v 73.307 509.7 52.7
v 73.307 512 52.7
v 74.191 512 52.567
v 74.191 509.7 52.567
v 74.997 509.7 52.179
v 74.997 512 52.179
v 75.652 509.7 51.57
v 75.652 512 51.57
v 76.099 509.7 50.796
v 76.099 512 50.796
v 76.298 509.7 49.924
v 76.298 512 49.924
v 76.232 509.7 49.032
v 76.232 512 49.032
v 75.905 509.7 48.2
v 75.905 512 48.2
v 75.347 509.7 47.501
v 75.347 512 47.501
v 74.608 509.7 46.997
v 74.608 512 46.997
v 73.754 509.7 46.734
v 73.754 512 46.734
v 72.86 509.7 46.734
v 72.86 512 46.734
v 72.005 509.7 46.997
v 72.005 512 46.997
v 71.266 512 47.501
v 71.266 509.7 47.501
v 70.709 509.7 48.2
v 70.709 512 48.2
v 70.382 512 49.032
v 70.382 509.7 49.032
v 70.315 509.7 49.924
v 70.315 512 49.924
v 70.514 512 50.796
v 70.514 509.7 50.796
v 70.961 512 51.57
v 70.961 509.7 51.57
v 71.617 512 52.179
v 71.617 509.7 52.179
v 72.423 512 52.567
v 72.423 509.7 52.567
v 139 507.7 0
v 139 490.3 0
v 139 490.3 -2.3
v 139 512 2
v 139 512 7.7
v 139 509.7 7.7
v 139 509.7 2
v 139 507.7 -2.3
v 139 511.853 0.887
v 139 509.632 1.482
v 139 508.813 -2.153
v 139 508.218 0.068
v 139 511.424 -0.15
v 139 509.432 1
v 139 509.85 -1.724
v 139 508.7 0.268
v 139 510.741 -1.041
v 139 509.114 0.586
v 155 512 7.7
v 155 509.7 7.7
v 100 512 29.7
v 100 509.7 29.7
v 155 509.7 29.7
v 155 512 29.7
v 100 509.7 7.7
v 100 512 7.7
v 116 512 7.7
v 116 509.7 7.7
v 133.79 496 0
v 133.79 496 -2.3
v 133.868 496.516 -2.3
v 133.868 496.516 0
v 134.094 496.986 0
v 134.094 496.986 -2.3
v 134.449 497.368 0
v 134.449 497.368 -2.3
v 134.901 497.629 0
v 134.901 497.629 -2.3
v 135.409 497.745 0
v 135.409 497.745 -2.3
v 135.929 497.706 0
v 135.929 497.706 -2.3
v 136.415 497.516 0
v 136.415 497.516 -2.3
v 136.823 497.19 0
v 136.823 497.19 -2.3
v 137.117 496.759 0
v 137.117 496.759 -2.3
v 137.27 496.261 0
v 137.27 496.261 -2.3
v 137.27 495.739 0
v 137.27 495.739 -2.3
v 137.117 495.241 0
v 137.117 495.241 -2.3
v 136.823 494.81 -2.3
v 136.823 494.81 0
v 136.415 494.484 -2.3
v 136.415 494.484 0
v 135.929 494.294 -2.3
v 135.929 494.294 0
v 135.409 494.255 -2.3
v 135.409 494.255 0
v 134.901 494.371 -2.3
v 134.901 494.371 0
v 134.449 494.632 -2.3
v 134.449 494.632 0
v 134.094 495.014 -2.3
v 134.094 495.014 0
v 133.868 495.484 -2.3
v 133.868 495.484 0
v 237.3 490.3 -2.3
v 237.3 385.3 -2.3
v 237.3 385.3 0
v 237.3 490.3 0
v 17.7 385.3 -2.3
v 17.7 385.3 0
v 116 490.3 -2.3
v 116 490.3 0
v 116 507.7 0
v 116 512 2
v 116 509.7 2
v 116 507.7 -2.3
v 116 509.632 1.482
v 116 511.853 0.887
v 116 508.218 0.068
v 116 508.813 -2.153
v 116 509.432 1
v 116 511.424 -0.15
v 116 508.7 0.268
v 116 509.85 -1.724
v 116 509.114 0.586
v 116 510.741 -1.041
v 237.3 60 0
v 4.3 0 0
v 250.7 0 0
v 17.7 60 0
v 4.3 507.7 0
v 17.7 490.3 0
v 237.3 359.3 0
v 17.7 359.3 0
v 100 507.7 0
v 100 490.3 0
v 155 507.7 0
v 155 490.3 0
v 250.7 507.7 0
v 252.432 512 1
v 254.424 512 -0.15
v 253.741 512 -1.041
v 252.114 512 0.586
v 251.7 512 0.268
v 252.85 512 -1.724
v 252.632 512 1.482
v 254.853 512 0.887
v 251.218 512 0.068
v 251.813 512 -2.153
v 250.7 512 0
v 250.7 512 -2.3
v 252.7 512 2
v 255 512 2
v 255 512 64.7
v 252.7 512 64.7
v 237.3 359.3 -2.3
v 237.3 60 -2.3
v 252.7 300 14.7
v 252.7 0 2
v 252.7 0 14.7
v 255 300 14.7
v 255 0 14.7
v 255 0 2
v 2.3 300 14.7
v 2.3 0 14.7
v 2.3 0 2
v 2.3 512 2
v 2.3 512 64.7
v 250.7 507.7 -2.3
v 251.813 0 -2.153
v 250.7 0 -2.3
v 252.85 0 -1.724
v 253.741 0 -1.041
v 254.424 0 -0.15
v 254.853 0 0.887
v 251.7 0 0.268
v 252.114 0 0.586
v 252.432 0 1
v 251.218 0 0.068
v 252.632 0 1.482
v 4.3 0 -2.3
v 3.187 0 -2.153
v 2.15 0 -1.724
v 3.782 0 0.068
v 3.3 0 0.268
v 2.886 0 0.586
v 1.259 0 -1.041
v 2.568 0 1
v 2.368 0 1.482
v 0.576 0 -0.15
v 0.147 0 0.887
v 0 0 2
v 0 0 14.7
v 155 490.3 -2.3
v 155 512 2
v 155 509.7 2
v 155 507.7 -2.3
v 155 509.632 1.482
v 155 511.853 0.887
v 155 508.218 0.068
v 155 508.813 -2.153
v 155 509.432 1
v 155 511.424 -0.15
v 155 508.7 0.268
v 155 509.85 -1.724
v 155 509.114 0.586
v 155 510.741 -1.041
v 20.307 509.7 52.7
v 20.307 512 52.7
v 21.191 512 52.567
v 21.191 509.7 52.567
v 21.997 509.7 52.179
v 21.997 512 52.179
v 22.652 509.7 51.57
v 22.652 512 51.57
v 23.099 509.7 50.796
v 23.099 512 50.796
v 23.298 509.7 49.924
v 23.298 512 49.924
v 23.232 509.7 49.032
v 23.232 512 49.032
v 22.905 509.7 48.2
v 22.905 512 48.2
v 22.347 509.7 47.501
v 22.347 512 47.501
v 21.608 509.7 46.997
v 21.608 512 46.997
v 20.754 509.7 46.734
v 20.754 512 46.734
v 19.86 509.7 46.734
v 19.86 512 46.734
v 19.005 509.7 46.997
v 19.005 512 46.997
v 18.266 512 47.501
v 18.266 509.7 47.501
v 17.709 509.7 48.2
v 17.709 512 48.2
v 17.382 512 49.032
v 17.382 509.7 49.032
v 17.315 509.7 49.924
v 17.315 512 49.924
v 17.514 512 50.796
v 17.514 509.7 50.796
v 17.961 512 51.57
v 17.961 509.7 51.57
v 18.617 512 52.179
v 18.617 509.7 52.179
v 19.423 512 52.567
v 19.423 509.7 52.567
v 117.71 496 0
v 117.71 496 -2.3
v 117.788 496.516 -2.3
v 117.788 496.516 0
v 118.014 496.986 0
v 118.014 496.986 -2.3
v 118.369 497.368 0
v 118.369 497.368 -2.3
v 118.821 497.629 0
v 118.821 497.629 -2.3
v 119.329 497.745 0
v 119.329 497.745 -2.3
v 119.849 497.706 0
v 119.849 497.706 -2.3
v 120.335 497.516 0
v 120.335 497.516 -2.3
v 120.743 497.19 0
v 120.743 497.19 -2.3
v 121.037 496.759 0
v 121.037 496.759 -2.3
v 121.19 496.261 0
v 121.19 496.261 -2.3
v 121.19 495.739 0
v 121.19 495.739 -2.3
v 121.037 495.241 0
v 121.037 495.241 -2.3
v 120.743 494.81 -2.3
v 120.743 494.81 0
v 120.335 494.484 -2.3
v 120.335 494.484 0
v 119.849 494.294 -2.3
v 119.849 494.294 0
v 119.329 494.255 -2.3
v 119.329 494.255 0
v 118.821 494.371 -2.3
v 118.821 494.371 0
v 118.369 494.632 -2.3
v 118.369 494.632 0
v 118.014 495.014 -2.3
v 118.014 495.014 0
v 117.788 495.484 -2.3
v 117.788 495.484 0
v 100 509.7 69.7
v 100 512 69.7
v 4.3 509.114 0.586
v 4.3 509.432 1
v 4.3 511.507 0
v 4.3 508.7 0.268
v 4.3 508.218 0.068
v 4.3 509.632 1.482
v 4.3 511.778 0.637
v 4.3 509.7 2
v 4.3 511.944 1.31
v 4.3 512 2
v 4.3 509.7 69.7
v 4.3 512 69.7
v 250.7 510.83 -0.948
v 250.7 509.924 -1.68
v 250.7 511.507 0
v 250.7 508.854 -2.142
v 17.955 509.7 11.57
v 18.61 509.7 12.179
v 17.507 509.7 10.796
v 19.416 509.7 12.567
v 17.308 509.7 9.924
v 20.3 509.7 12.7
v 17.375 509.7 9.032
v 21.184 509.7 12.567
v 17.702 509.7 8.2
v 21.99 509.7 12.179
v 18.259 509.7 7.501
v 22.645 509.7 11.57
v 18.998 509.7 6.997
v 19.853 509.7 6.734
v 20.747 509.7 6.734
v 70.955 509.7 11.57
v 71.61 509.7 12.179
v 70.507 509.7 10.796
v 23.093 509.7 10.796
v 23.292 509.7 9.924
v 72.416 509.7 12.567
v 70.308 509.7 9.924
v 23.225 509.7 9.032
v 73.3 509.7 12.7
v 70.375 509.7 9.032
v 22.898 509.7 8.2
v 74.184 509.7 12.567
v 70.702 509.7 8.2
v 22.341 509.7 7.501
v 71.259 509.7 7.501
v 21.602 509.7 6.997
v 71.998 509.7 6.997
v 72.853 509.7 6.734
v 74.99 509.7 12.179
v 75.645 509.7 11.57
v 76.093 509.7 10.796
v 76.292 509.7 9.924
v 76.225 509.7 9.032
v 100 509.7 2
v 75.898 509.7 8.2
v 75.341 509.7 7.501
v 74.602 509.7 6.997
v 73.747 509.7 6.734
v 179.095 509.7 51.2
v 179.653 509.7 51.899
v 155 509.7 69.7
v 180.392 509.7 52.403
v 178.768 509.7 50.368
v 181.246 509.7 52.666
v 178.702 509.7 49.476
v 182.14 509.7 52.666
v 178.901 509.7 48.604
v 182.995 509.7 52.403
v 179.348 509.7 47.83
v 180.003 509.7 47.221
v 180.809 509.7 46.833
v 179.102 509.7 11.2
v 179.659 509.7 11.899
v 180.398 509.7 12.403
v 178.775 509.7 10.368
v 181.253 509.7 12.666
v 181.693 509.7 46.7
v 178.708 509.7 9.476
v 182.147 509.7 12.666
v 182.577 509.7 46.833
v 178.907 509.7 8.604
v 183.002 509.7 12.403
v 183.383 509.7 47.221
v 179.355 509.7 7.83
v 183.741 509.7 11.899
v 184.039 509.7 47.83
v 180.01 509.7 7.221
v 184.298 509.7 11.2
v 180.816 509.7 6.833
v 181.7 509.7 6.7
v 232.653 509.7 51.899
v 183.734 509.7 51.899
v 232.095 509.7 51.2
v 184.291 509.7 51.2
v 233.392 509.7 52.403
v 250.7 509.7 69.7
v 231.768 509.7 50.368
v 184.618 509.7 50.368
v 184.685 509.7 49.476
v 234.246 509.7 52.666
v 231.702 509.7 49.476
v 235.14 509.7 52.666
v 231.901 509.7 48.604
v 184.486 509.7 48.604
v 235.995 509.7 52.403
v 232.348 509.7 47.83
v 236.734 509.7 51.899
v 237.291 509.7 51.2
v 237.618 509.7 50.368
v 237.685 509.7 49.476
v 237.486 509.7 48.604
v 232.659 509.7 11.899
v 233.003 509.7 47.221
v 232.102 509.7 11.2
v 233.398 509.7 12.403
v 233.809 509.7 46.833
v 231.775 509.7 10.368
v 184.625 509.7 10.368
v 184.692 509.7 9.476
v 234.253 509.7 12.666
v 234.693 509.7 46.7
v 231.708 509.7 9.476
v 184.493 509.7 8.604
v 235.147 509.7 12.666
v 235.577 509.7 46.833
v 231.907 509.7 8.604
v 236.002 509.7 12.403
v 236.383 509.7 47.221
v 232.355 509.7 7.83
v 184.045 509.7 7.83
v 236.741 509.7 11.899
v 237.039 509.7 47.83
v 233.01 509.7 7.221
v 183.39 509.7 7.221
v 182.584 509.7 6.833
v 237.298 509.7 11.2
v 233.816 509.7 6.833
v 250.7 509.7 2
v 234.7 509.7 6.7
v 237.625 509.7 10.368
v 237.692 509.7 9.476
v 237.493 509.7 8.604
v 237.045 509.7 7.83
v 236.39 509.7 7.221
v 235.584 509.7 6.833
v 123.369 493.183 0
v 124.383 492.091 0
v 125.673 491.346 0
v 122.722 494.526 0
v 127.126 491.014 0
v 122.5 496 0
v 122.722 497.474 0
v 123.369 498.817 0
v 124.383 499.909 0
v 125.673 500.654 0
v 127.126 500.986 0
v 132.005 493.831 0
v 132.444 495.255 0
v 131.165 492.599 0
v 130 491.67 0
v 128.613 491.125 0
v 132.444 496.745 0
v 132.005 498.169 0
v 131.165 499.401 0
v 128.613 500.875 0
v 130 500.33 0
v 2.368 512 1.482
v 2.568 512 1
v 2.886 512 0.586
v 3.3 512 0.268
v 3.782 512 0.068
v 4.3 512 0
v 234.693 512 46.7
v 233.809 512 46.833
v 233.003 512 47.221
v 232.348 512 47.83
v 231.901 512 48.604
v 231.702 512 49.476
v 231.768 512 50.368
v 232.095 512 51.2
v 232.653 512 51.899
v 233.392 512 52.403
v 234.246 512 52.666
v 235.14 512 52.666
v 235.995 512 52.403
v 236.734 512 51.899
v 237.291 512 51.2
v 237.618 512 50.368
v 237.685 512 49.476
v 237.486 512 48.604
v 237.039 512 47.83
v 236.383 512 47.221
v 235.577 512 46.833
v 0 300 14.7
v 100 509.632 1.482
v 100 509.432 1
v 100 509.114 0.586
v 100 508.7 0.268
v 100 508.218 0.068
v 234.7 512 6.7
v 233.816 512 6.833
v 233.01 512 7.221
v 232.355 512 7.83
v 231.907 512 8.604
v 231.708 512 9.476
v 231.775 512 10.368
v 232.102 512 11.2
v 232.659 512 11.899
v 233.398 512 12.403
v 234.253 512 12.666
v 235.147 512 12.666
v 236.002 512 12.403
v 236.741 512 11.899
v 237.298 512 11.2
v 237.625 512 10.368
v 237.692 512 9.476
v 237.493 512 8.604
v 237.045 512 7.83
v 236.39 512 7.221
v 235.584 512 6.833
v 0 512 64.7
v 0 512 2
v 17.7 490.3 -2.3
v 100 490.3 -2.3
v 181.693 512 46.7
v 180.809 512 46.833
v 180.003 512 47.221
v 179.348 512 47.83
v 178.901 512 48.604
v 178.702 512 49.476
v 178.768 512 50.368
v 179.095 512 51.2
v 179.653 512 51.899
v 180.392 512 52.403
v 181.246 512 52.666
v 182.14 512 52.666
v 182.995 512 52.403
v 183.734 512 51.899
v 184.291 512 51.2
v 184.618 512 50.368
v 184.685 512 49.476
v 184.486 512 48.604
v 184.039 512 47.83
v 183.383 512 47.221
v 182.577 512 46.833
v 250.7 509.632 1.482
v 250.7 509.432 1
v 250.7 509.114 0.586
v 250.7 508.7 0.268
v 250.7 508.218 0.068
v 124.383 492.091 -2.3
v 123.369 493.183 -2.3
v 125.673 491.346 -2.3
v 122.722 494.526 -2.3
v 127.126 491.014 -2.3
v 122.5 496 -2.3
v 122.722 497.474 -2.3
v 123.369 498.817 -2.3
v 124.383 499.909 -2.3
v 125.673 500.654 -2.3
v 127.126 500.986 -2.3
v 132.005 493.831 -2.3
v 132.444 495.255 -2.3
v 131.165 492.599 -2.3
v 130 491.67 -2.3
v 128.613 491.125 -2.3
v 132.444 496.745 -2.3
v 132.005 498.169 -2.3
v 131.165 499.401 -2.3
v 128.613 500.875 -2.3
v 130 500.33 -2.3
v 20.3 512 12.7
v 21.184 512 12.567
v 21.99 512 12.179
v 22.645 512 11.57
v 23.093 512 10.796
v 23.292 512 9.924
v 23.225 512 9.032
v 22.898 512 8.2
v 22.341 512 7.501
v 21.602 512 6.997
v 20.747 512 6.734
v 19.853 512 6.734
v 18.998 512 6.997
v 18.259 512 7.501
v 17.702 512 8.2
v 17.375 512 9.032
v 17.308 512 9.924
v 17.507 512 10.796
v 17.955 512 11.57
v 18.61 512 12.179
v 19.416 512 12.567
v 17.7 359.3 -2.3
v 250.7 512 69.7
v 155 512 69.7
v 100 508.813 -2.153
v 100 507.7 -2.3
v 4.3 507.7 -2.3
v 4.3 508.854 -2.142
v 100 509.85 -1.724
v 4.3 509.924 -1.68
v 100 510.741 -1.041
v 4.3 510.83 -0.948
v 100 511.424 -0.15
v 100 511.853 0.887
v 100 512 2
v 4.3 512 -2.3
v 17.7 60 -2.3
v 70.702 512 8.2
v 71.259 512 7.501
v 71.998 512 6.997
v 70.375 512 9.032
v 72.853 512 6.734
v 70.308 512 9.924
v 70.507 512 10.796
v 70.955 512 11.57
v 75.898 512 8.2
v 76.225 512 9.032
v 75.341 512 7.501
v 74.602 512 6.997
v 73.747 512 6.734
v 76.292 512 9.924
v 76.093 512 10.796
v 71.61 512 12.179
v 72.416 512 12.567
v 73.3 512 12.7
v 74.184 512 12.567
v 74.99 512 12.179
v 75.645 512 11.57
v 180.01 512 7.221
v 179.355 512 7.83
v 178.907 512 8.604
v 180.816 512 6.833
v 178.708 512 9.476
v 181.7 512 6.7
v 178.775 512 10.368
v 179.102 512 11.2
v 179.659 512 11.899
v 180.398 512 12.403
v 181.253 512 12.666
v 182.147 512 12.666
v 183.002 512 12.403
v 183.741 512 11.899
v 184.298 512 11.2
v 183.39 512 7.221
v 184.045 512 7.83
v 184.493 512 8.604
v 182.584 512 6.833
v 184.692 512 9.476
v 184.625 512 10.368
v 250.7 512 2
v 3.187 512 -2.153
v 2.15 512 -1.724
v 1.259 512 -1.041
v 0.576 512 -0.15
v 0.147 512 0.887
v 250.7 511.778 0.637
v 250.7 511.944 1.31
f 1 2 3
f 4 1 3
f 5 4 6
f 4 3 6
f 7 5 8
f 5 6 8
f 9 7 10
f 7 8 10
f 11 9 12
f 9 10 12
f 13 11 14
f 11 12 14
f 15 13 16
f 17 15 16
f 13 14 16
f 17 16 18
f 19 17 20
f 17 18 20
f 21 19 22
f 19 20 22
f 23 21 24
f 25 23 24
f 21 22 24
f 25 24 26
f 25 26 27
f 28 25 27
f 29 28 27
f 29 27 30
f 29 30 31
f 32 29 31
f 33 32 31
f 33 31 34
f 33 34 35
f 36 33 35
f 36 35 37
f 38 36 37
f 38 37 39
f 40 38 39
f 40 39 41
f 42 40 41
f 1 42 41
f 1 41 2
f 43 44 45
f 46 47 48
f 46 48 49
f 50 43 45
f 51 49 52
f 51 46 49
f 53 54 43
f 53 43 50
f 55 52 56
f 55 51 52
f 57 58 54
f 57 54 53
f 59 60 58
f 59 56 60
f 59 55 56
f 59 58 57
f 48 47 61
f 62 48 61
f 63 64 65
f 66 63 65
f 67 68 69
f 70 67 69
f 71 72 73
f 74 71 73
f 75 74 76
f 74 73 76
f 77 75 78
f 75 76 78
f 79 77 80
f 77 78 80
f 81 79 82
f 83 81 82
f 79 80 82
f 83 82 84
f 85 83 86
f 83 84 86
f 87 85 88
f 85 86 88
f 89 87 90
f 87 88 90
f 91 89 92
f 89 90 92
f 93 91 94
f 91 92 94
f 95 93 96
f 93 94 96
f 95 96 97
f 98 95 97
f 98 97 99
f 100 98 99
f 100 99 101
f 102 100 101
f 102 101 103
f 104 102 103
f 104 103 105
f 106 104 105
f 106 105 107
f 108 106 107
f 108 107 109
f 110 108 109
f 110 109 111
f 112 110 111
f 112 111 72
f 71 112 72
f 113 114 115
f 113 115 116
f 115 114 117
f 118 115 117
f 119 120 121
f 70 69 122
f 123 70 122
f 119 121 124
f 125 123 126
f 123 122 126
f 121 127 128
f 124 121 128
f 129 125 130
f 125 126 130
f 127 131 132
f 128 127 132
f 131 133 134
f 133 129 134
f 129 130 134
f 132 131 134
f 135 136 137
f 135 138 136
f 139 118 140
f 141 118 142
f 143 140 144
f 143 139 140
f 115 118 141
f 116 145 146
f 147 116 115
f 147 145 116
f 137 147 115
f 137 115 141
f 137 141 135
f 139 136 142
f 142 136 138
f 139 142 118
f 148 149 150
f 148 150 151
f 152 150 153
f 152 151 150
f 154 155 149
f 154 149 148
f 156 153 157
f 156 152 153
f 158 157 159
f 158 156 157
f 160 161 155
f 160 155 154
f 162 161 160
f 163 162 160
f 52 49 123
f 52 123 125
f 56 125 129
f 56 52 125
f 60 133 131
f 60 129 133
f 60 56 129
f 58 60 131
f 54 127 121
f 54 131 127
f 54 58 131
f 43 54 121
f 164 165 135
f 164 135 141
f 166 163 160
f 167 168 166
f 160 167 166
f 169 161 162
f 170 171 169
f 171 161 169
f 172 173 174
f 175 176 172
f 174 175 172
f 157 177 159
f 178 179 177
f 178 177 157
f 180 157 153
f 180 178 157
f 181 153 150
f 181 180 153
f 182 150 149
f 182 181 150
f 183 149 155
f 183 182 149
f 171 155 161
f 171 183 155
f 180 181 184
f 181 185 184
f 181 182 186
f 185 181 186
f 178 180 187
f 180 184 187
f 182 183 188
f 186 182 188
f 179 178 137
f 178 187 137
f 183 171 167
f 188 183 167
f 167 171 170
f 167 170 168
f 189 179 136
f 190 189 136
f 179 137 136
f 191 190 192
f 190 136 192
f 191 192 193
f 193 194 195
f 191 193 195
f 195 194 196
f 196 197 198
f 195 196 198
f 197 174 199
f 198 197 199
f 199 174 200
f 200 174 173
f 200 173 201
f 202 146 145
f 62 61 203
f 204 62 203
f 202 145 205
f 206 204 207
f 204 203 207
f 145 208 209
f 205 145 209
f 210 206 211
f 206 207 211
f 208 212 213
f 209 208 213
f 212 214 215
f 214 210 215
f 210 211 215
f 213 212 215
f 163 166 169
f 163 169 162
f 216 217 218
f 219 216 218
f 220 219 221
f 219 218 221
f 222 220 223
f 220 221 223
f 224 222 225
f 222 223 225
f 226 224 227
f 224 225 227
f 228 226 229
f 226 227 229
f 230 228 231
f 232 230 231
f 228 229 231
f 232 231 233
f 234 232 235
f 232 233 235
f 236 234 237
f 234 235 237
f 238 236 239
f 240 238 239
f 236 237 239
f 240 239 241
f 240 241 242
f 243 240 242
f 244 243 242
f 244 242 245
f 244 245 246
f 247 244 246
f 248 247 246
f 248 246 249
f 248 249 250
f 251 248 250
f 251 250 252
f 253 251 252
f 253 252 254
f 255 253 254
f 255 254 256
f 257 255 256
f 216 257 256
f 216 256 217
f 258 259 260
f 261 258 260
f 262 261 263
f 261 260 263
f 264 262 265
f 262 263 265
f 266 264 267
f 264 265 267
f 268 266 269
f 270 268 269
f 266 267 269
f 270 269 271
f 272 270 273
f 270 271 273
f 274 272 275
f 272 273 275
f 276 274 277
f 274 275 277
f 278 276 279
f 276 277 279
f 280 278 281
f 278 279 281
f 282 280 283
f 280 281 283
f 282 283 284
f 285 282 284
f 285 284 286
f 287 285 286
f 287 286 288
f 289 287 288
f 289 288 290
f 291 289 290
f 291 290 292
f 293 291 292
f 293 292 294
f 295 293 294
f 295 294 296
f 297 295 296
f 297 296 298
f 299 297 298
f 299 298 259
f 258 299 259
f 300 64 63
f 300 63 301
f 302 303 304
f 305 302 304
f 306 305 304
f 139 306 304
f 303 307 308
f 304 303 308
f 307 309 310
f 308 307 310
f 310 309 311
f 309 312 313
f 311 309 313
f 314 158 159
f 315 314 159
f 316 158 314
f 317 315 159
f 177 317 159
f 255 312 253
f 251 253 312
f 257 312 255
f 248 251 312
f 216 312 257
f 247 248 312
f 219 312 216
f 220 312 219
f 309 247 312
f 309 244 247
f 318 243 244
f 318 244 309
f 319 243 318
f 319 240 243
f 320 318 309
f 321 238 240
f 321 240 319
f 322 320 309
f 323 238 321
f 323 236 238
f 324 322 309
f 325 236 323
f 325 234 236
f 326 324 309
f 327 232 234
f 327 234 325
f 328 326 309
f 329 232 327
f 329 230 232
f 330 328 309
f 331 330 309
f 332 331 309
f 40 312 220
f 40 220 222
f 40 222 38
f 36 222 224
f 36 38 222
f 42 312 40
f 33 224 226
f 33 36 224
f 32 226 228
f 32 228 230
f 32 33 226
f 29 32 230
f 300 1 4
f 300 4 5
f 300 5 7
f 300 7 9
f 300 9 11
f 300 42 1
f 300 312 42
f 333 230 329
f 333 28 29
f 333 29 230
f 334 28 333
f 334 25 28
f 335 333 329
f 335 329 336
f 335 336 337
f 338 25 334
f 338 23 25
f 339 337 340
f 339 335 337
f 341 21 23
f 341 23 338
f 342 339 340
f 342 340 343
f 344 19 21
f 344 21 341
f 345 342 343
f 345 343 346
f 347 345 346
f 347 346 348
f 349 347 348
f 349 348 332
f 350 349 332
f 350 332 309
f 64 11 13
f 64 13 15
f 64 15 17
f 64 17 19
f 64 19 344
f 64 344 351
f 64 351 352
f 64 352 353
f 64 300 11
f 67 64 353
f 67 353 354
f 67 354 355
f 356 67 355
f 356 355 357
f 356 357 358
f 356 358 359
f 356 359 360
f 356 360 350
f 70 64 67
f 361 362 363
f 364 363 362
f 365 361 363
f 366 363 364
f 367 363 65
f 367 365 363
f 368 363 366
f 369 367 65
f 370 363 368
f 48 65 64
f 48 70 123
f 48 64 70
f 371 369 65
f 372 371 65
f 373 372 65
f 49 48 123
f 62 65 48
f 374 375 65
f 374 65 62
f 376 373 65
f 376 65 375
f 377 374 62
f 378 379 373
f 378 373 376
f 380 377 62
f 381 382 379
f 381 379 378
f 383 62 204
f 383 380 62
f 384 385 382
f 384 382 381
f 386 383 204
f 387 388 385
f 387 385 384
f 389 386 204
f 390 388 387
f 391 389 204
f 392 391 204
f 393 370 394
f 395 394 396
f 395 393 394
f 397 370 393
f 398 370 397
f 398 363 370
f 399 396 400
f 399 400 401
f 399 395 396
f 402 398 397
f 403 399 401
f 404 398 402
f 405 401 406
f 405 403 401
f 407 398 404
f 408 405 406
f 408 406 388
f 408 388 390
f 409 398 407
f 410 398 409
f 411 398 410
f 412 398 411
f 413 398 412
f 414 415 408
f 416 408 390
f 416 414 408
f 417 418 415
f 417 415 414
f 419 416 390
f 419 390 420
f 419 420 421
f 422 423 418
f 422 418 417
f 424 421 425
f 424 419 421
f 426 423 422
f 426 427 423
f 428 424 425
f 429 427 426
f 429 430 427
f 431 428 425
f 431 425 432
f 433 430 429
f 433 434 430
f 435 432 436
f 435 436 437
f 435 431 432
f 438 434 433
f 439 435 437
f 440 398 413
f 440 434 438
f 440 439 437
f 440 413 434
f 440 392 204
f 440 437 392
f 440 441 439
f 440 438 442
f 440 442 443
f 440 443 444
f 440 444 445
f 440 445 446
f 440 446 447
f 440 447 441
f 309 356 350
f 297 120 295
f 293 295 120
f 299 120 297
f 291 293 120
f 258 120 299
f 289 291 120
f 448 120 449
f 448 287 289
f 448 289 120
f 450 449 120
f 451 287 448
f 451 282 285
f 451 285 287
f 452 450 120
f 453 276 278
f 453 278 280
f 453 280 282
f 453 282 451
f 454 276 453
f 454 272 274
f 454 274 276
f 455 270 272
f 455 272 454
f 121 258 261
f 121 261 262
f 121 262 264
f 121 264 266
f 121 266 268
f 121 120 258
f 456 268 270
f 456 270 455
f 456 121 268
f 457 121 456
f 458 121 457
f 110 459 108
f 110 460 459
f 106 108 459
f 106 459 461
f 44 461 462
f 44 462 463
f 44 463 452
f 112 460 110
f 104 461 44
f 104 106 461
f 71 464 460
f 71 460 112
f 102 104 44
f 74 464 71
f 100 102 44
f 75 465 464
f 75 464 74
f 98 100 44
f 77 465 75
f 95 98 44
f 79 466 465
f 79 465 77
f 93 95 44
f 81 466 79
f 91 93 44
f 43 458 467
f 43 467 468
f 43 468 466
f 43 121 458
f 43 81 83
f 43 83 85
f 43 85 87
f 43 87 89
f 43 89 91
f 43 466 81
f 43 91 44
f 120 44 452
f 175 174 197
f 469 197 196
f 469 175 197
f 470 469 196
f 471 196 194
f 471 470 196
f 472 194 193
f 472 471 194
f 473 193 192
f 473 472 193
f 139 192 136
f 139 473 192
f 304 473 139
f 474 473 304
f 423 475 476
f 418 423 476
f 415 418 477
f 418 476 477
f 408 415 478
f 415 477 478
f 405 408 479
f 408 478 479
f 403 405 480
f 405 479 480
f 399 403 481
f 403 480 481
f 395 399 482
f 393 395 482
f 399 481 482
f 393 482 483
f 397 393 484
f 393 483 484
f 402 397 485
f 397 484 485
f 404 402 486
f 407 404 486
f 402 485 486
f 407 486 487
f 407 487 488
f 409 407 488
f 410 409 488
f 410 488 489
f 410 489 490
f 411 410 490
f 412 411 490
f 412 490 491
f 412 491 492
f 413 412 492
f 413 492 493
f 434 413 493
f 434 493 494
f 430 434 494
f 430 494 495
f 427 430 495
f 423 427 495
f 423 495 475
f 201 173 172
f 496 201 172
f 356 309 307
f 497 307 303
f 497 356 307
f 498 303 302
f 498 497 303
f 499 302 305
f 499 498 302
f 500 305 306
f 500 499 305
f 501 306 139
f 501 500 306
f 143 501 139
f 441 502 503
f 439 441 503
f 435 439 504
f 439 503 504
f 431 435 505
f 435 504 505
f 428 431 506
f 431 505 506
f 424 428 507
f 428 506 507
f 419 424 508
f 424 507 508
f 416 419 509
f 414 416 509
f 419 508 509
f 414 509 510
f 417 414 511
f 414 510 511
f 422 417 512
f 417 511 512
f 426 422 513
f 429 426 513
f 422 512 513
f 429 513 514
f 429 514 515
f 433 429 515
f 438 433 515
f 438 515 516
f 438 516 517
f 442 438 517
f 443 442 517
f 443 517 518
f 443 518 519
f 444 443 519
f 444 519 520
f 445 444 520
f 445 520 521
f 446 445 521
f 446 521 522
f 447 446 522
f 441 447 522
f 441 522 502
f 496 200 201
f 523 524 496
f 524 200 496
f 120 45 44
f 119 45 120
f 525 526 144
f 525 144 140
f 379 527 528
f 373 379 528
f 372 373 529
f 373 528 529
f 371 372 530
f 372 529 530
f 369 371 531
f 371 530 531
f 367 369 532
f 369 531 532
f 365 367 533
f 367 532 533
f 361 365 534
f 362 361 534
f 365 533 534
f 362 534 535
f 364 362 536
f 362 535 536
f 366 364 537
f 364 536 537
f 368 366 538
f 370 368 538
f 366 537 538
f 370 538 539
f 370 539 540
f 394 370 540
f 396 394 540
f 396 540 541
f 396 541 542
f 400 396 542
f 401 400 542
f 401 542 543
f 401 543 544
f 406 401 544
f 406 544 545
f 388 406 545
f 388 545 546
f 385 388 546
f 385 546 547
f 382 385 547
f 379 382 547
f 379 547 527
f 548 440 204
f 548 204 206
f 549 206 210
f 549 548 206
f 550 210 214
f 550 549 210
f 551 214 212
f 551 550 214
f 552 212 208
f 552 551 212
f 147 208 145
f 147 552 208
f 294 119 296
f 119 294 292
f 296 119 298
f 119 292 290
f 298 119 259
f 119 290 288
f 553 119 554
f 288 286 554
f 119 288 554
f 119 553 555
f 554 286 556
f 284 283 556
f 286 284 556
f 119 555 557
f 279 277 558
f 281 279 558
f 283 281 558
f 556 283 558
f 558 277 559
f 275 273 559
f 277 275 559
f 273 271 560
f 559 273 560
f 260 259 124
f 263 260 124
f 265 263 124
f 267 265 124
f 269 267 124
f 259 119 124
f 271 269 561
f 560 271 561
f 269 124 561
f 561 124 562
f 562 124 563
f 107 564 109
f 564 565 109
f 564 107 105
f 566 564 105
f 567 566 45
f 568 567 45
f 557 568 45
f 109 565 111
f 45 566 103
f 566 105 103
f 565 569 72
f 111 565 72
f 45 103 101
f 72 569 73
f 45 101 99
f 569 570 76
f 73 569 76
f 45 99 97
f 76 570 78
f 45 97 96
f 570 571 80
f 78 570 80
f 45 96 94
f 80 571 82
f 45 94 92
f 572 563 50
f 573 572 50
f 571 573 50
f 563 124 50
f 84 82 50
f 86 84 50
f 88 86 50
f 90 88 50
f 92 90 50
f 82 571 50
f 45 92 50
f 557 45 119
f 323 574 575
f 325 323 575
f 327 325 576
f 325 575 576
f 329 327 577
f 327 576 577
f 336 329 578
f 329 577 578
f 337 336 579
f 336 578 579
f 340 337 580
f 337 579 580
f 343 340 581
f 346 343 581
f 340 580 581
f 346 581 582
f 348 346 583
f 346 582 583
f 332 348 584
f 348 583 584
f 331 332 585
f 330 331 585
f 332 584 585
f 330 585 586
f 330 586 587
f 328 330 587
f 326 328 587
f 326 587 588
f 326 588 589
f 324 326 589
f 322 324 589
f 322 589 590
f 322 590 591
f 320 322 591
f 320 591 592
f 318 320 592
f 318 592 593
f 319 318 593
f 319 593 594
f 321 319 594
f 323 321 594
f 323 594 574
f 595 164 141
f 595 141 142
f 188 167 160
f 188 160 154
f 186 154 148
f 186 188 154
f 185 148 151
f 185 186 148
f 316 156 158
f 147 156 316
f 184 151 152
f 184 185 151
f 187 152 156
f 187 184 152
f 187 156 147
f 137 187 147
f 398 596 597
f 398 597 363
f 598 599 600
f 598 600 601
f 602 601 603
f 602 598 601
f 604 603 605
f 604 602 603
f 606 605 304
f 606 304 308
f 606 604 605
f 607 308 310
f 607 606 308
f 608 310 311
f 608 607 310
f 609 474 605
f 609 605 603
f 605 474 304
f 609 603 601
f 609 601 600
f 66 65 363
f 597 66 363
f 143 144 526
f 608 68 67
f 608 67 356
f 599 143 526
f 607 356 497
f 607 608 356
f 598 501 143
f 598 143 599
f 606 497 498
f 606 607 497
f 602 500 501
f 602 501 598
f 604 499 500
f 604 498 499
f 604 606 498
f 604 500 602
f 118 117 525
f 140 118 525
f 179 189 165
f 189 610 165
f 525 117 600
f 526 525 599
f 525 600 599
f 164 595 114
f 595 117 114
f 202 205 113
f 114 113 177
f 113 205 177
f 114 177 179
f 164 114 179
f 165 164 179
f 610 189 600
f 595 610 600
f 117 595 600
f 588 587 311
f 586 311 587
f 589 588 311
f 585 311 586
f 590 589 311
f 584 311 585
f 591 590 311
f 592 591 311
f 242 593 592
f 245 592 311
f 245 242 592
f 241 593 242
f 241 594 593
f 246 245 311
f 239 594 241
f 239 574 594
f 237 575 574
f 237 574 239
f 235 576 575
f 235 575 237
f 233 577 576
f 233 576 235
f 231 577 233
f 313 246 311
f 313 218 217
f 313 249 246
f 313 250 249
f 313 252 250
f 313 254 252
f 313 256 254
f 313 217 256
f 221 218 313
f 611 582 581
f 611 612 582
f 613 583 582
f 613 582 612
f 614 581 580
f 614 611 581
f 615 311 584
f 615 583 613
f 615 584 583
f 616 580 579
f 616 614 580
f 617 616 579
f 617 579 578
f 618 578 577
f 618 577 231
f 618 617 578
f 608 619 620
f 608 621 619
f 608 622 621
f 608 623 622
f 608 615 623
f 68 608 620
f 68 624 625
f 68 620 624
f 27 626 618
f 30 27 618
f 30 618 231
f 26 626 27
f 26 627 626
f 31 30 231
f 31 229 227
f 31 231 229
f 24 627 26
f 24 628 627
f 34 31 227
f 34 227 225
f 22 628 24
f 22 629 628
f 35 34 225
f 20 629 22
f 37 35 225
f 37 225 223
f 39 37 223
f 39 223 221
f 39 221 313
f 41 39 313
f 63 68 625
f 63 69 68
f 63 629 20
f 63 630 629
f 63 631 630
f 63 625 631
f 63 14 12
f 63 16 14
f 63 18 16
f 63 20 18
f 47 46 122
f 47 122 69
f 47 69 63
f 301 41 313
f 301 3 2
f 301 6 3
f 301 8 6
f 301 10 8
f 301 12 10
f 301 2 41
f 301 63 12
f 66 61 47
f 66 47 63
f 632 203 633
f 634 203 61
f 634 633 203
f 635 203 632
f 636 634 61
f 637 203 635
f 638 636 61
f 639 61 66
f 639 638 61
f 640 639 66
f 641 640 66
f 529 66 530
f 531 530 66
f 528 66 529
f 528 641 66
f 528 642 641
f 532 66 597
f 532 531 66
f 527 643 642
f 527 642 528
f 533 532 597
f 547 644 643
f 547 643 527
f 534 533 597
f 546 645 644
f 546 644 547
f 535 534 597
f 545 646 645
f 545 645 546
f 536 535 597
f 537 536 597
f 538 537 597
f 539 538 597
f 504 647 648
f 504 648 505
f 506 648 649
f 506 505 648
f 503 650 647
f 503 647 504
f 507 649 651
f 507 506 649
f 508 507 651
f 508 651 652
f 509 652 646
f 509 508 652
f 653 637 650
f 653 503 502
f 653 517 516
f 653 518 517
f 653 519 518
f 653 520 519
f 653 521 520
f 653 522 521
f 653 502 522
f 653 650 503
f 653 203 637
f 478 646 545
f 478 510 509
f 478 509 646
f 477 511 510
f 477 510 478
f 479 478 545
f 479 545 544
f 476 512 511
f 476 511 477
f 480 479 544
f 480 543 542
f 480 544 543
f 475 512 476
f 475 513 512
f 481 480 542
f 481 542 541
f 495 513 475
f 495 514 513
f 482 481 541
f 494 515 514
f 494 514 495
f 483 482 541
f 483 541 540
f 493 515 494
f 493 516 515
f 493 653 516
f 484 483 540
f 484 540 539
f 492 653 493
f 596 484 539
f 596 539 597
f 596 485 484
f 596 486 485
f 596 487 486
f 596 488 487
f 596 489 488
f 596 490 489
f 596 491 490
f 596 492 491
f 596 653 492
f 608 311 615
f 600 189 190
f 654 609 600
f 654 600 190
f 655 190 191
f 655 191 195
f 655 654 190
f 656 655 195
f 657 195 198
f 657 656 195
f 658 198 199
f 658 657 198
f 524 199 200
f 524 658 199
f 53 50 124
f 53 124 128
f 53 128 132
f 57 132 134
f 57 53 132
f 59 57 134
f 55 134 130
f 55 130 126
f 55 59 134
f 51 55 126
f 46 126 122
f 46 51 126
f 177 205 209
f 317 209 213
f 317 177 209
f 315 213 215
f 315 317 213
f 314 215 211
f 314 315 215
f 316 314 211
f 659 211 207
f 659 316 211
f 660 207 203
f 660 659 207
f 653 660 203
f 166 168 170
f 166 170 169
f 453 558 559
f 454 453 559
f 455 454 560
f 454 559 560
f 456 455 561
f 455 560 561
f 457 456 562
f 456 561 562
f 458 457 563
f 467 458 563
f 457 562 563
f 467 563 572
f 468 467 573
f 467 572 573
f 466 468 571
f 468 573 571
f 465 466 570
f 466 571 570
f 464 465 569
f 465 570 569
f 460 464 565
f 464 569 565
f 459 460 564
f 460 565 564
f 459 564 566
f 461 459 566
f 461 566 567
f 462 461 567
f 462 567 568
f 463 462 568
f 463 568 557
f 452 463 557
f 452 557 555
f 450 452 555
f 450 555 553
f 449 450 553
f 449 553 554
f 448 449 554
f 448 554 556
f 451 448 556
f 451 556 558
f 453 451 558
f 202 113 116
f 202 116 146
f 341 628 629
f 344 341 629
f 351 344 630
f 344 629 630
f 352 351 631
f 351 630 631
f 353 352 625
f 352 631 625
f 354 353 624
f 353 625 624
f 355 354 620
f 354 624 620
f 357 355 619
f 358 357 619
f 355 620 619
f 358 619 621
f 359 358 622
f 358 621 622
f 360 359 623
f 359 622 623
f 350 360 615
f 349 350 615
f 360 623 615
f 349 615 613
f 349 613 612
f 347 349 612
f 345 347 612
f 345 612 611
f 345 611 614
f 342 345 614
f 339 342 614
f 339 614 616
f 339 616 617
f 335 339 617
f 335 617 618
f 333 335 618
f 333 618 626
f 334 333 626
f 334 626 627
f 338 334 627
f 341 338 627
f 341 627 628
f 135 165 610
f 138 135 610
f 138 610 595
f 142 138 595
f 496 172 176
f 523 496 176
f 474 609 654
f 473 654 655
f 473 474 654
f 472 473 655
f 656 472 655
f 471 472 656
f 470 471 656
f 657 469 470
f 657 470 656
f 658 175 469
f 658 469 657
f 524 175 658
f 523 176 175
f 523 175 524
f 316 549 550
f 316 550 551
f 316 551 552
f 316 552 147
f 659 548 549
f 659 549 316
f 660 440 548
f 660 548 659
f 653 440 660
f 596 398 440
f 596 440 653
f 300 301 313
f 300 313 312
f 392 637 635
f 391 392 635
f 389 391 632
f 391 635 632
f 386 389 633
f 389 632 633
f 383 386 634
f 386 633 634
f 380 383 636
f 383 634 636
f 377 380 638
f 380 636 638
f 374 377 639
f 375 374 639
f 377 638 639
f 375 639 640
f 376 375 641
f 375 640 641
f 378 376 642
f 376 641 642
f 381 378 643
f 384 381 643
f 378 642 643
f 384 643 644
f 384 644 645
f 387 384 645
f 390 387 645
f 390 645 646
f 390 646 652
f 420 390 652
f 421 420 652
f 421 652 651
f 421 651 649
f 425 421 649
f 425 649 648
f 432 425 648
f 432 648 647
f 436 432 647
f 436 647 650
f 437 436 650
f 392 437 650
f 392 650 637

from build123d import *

# Parameters (mm, degrees)
SKETCH1_W                    = 255
SKETCH1_H                    = 512
BASE_FLANGE1_DEPTH           = 2.3
EDGE_FLANGE2_STRIP_W         = 13.2
EDGE_FLANGE2_STRIP_H         = 2.3
EDGE_FLANGE2_STRIP_CUT_DEPTH = 512
EDGE_FLANGE2_DEPTH           = 512
EDGE_FLANGE3_STRIP_W         = 13.2
EDGE_FLANGE3_STRIP_H         = 2.3
EDGE_FLANGE3_STRIP_CUT_DEPTH = 512
EDGE_FLANGE3_DEPTH           = 512
CUT_EXTRUDE2_START           = -10
CUT_EXTRUDE2_DEPTH           = 586.634510779
EDGE_FLANGE4_STRIP_W         = 13.2
EDGE_FLANGE4_STRIP_H         = 2.3
EDGE_FLANGE4_STRIP_CUT_DEPTH = 246.4
EDGE_FLANGE4_DEPTH           = 246.4
CUT_EXTRUDE3_REACH           = 578.501
SKETCH23_W                   = 219.6
SKETCH23_H                   = 299.3
CUT_EXTRUDE4_REACH           = 578.501
SKETCH24_W                   = 219.6
SKETCH24_H                   = 105
CUT_EXTRUDE6_REACH           = 576.175
SKETCH25_W                   = 55
SKETCH25_H                   = 40
CUT_EXTRUDE7_REACH           = 578.218
SKETCH27_W                   = 16
SKETCH27_H                   = 10
CUT_EXTRUDE8_REACH           = 578.501
SKETCH28_R                   = 5
CUT_EXTRUDE9_REACH           = 578.501
SKETCH29_R                   = 1.75
CUT_EXTRUDE10_REACH          = 578.218
SKETCH30_R                   = 3


# Sheet-metal steps are written as plain solids
with BuildPart() as part:
    # Sketch1 → Base-Flange1 (new body)
    with BuildSketch(Plane.XY):
        with Locations((127.5, 256)):
            Rectangle(SKETCH1_W, SKETCH1_H)
    extrude(amount=-BASE_FLANGE1_DEPTH)

    # Edge-Flange2 strip (across the edge) → Edge-Flange2 strip cut (cut)
    with BuildSketch(Plane(origin=(255, 0, 0), x_dir=(-1, 0, 0), z_dir=(0, 1, 0))):
        with Locations((-2.3, -1.15)):
            Rectangle(EDGE_FLANGE2_STRIP_W, EDGE_FLANGE2_STRIP_H)
    extrude(amount=EDGE_FLANGE2_STRIP_CUT_DEPTH, mode=Mode.SUBTRACT)

    # Edge-Flange2 section (across the edge) → Edge-Flange2 (add)
    with BuildSketch(Plane(origin=(255, 0, 0), x_dir=(-1, 0, 0), z_dir=(0, 1, 0))):
        with BuildLine():
            Line((0, 2), (0, 64.7))
            Line((0, 64.7), (2.3, 64.7))
            Line((2.3, 64.7), (2.3, 2))
            ThreePointArc((2.3, 2), (2.885786438, 0.585786438), (4.3, 0))
            Line((4.3, 0), (4.3, -2.3))
            ThreePointArc((4.3, -2.3), (1.259440841, -1.040559159), (0, 2))
        make_face()
    extrude(amount=EDGE_FLANGE2_DEPTH)

    # Edge-Flange3 strip (across the edge) → Edge-Flange3 strip cut (cut)
    with BuildSketch(Plane.XZ.offset(-512)):
        with Locations((-2.3, -1.15)):
            Rectangle(EDGE_FLANGE3_STRIP_W, EDGE_FLANGE3_STRIP_H)
    extrude(amount=EDGE_FLANGE3_STRIP_CUT_DEPTH, mode=Mode.SUBTRACT)

    # Edge-Flange3 section (across the edge) → Edge-Flange3 (add)
    with BuildSketch(Plane.XZ.offset(-512)):
        with BuildLine():
            Line((0, 2), (0, 64.7))
            Line((0, 64.7), (2.3, 64.7))
            Line((2.3, 64.7), (2.3, 2))
            ThreePointArc((2.3, 2), (2.885786438, 0.585786438), (4.3, 0))
            Line((4.3, 0), (4.3, -2.3))
            ThreePointArc((4.3, -2.3), (1.259440841, -1.040559159), (0, 2))
        make_face()
    extrude(amount=EDGE_FLANGE3_DEPTH)

    # Sketch17 → Cut-Extrude2 (cut)
    with BuildSketch(Plane(origin=(255, 0, 0), x_dir=(0, 0, -1), z_dir=(1, 0, 0)).offset(CUT_EXTRUDE2_START)):
        Polygon((-14.7, -1042.730361711), (-14.7, 0), (-14.7, 300), (-64.7, 512), (-64.7, 0), (-64.7, -1042.730361711), (-64.7, -3128.191085133), (-14.7, -3128.191085133), align=None)
    cut_extrude2 = extrude(amount=CUT_EXTRUDE2_DEPTH, mode=Mode.SUBTRACT)

    # Mirror6: Cut-Extrude2 across plane
    add(cut_extrude2.mirror(Plane(origin=(126.35, 0, 0), x_dir=(0, 0, 1), z_dir=(1, 0, 0))), mode=Mode.SUBTRACT)

    # Edge-Flange4 strip (across the edge) → Edge-Flange4 strip cut (cut)
    with BuildSketch(Plane(origin=(250.7, 512, 0), x_dir=(0, -1, 0), z_dir=(-1, 0, 0))):
        with Locations((-2.3, -1.15)):
            Rectangle(EDGE_FLANGE4_STRIP_W, EDGE_FLANGE4_STRIP_H)
    extrude(amount=EDGE_FLANGE4_STRIP_CUT_DEPTH, mode=Mode.SUBTRACT)

    # Edge-Flange4 section (across the edge) → Edge-Flange4 (add)
    with BuildSketch(Plane(origin=(250.7, 512, 0), x_dir=(0, -1, 0), z_dir=(-1, 0, 0))):
        with BuildLine():
            Line((0, 2), (0, 69.7))
            Line((0, 69.7), (2.3, 69.7))
            Line((2.3, 69.7), (2.3, 2))
            ThreePointArc((2.3, 2), (2.885786438, 0.585786438), (4.3, 0))
            Line((4.3, 0), (4.3, -2.3))
            ThreePointArc((4.3, -2.3), (1.259440841, -1.040559159), (0, 2))
        make_face()
    extrude(amount=EDGE_FLANGE4_DEPTH)

    # Sketch23 → Cut-Extrude3 (cut, up to next)
    with BuildSketch(Plane(origin=(0, 0, -2.3), x_dir=(-1, 0, 0), z_dir=(0, 0, -1)), mode=Mode.PRIVATE) as cut_extrude3_sk1:
        with Locations((-127.5, 209.65)):
            Rectangle(SKETCH23_W, SKETCH23_H)
    cut_extrude3_tool1 = extrude(cut_extrude3_sk1.sketch, amount=-CUT_EXTRUDE3_REACH, mode=Mode.PRIVATE) & part.part
    add(cut_extrude3_tool1.solids().sort_by_distance((127.5, 209.65, -2.3))[0], mode=Mode.SUBTRACT)

    # Sketch24 → Cut-Extrude4 (cut, up to next)
    with BuildSketch(Plane(origin=(0, 0, -2.3), x_dir=(-1, 0, 0), z_dir=(0, 0, -1)), mode=Mode.PRIVATE) as cut_extrude4_sk1:
        with Locations((-127.5, 437.8)):
            Rectangle(SKETCH24_W, SKETCH24_H)
    cut_extrude4_tool1 = extrude(cut_extrude4_sk1.sketch, amount=-CUT_EXTRUDE4_REACH, mode=Mode.PRIVATE) & part.part
    add(cut_extrude4_tool1.solids().sort_by_distance((127.5, 437.8, -2.3))[0], mode=Mode.SUBTRACT)

    # Sketch25 → Cut-Extrude6 (cut, up to next)
    with BuildSketch(Plane.XZ.offset(-509.7), mode=Mode.PRIVATE) as cut_extrude6_sk1:
        with Locations((127.5, 49.7)):
            Rectangle(SKETCH25_W, SKETCH25_H)
    cut_extrude6_tool1 = extrude(cut_extrude6_sk1.sketch, amount=-CUT_EXTRUDE6_REACH, mode=Mode.PRIVATE) & part.part
    add(cut_extrude6_tool1.solids().sort_by_distance((127.5, 509.7, 49.7))[0], mode=Mode.SUBTRACT)

    # Sketch27 → Cut-Extrude7 (cut, up to next)
    with BuildSketch(Plane(origin=(0, 512, 0), x_dir=(1, 0, 0), z_dir=(0, 1, 0)), mode=Mode.PRIVATE) as cut_extrude7_sk1:
        with Locations((108, -2.7)):
            Rectangle(SKETCH27_W, SKETCH27_H)
    cut_extrude7_tool1 = extrude(cut_extrude7_sk1.sketch, amount=-CUT_EXTRUDE7_REACH, mode=Mode.PRIVATE) & part.part
    # Sketch27 → Cut-Extrude7 (cut, up to next)
    with BuildSketch(Plane(origin=(0, 512, 0), x_dir=(1, 0, 0), z_dir=(0, 1, 0)), mode=Mode.PRIVATE) as cut_extrude7_sk2:
        with Locations((147, -2.7)):
            Rectangle(SKETCH27_W, SKETCH27_H)
    cut_extrude7_tool2 = extrude(cut_extrude7_sk2.sketch, amount=-CUT_EXTRUDE7_REACH, mode=Mode.PRIVATE) & part.part
    add(cut_extrude7_tool1.solids().sort_by_distance((108, 512, 2.7))[0], mode=Mode.SUBTRACT)
    add(cut_extrude7_tool2.solids().sort_by_distance((147, 512, 2.7))[0], mode=Mode.SUBTRACT)

    # Sketch28 → Cut-Extrude8 (cut, up to next)
    with BuildSketch(Plane(origin=(0, 0, -2.3), x_dir=(-1, 0, 0), z_dir=(0, 0, -1)), mode=Mode.PRIVATE) as cut_extrude8_sk1:
        with Locations((-127.5, 496)):
            Circle(SKETCH28_R)
    cut_extrude8_tool1 = extrude(cut_extrude8_sk1.sketch, amount=-CUT_EXTRUDE8_REACH, mode=Mode.PRIVATE) & part.part
    add(cut_extrude8_tool1.solids().sort_by_distance((127.5, 496, -2.3))[0], mode=Mode.SUBTRACT)

    # Sketch29 → Cut-Extrude9 (cut, up to next)
    with BuildSketch(Plane(origin=(0, 0, -2.3), x_dir=(-1, 0, 0), z_dir=(0, 0, -1)), mode=Mode.PRIVATE) as cut_extrude9_sk1:
        with Locations((-119.46, 496)):
            Circle(SKETCH29_R)
    cut_extrude9_tool1 = extrude(cut_extrude9_sk1.sketch, amount=-CUT_EXTRUDE9_REACH, mode=Mode.PRIVATE) & part.part
    # Sketch29 → Cut-Extrude9 (cut, up to next)
    with BuildSketch(Plane(origin=(0, 0, -2.3), x_dir=(-1, 0, 0), z_dir=(0, 0, -1)), mode=Mode.PRIVATE) as cut_extrude9_sk2:
        with Locations((-135.54, 496)):
            Circle(SKETCH29_R)
    cut_extrude9_tool2 = extrude(cut_extrude9_sk2.sketch, amount=-CUT_EXTRUDE9_REACH, mode=Mode.PRIVATE) & part.part
    add(cut_extrude9_tool1.solids().sort_by_distance((119.46, 496, -2.3))[0], mode=Mode.SUBTRACT)
    add(cut_extrude9_tool2.solids().sort_by_distance((135.54, 496, -2.3))[0], mode=Mode.SUBTRACT)

    # Sketch30 → Cut-Extrude10 (cut, up to next)
    with BuildSketch(Plane(origin=(0, 512, 0), x_dir=(1, 0, 0), z_dir=(0, 1, 0)), mode=Mode.PRIVATE) as cut_extrude10_sk1:
        with Locations(Location((20.3, -9.700000578, 0), (0, 0, 270))):
            Circle(SKETCH30_R)
    cut_extrude10_tool1 = extrude(cut_extrude10_sk1.sketch, amount=-CUT_EXTRUDE10_REACH, mode=Mode.PRIVATE) & part.part
    # Sketch30 → Cut-Extrude10 (cut, up to next)
    with BuildSketch(Plane(origin=(0, 512, 0), x_dir=(1, 0, 0), z_dir=(0, 1, 0)), mode=Mode.PRIVATE) as cut_extrude10_sk2:
        with Locations(Location((73.3, -9.700000578, 0), (0, 0, 270))):
            Circle(SKETCH30_R)
    cut_extrude10_tool2 = extrude(cut_extrude10_sk2.sketch, amount=-CUT_EXTRUDE10_REACH, mode=Mode.PRIVATE) & part.part
    # Sketch30 → Cut-Extrude10 (cut, up to next)
    with BuildSketch(Plane(origin=(0, 512, 0), x_dir=(1, 0, 0), z_dir=(0, 1, 0)), mode=Mode.PRIVATE) as cut_extrude10_sk3:
        with Locations(Location((20.306798441, -49.7, 0), (0, 0, 270))):
            Circle(SKETCH30_R)
    cut_extrude10_tool3 = extrude(cut_extrude10_sk3.sketch, amount=-CUT_EXTRUDE10_REACH, mode=Mode.PRIVATE) & part.part
    # Sketch30 → Cut-Extrude10 (cut, up to next)
    with BuildSketch(Plane(origin=(0, 512, 0), x_dir=(1, 0, 0), z_dir=(0, 1, 0)), mode=Mode.PRIVATE) as cut_extrude10_sk4:
        with Locations(Location((73.306798441, -49.7, 0), (0, 0, 270))):
            Circle(SKETCH30_R)
    cut_extrude10_tool4 = extrude(cut_extrude10_sk4.sketch, amount=-CUT_EXTRUDE10_REACH, mode=Mode.PRIVATE) & part.part
    # Sketch30 → Cut-Extrude10 (cut, up to next)
    with BuildSketch(Plane(origin=(0, 512, 0), x_dir=(1, 0, 0), z_dir=(0, 1, 0)), mode=Mode.PRIVATE) as cut_extrude10_sk5:
        with Locations(Location((181.693201559, -49.7, 0), (0, 0, 90))):
            Circle(SKETCH30_R)
    cut_extrude10_tool5 = extrude(cut_extrude10_sk5.sketch, amount=-CUT_EXTRUDE10_REACH, mode=Mode.PRIVATE) & part.part
    # Sketch30 → Cut-Extrude10 (cut, up to next)
    with BuildSketch(Plane(origin=(0, 512, 0), x_dir=(1, 0, 0), z_dir=(0, 1, 0)), mode=Mode.PRIVATE) as cut_extrude10_sk6:
        with Locations(Location((234.693201559, -49.7, 0), (0, 0, 90))):
            Circle(SKETCH30_R)
    cut_extrude10_tool6 = extrude(cut_extrude10_sk6.sketch, amount=-CUT_EXTRUDE10_REACH, mode=Mode.PRIVATE) & part.part
    # Sketch30 → Cut-Extrude10 (cut, up to next)
    with BuildSketch(Plane(origin=(0, 512, 0), x_dir=(1, 0, 0), z_dir=(0, 1, 0)), mode=Mode.PRIVATE) as cut_extrude10_sk7:
        with Locations(Location((181.7, -9.700000578, 0), (0, 0, 90))):
            Circle(SKETCH30_R)
    cut_extrude10_tool7 = extrude(cut_extrude10_sk7.sketch, amount=-CUT_EXTRUDE10_REACH, mode=Mode.PRIVATE) & part.part
    # Sketch30 → Cut-Extrude10 (cut, up to next)
    with BuildSketch(Plane(origin=(0, 512, 0), x_dir=(1, 0, 0), z_dir=(0, 1, 0)), mode=Mode.PRIVATE) as cut_extrude10_sk8:
        with Locations(Location((234.7, -9.700000578, 0), (0, 0, 90))):
            Circle(SKETCH30_R)
    cut_extrude10_tool8 = extrude(cut_extrude10_sk8.sketch, amount=-CUT_EXTRUDE10_REACH, mode=Mode.PRIVATE) & part.part
    add(cut_extrude10_tool1.solids().sort_by_distance((20.3, 512, 9.700001))[0], mode=Mode.SUBTRACT)
    add(cut_extrude10_tool2.solids().sort_by_distance((73.3, 512, 9.700001))[0], mode=Mode.SUBTRACT)
    add(cut_extrude10_tool3.solids().sort_by_distance((20.306798, 512, 49.7))[0], mode=Mode.SUBTRACT)
    add(cut_extrude10_tool4.solids().sort_by_distance((73.306798, 512, 49.7))[0], mode=Mode.SUBTRACT)
    add(cut_extrude10_tool5.solids().sort_by_distance((181.693202, 512, 49.7))[0], mode=Mode.SUBTRACT)
    add(cut_extrude10_tool6.solids().sort_by_distance((234.693202, 512, 49.7))[0], mode=Mode.SUBTRACT)
    add(cut_extrude10_tool7.solids().sort_by_distance((181.7, 512, 9.700001))[0], mode=Mode.SUBTRACT)
    add(cut_extrude10_tool8.solids().sort_by_distance((234.7, 512, 9.700001))[0], mode=Mode.SUBTRACT)


solid = part.part
